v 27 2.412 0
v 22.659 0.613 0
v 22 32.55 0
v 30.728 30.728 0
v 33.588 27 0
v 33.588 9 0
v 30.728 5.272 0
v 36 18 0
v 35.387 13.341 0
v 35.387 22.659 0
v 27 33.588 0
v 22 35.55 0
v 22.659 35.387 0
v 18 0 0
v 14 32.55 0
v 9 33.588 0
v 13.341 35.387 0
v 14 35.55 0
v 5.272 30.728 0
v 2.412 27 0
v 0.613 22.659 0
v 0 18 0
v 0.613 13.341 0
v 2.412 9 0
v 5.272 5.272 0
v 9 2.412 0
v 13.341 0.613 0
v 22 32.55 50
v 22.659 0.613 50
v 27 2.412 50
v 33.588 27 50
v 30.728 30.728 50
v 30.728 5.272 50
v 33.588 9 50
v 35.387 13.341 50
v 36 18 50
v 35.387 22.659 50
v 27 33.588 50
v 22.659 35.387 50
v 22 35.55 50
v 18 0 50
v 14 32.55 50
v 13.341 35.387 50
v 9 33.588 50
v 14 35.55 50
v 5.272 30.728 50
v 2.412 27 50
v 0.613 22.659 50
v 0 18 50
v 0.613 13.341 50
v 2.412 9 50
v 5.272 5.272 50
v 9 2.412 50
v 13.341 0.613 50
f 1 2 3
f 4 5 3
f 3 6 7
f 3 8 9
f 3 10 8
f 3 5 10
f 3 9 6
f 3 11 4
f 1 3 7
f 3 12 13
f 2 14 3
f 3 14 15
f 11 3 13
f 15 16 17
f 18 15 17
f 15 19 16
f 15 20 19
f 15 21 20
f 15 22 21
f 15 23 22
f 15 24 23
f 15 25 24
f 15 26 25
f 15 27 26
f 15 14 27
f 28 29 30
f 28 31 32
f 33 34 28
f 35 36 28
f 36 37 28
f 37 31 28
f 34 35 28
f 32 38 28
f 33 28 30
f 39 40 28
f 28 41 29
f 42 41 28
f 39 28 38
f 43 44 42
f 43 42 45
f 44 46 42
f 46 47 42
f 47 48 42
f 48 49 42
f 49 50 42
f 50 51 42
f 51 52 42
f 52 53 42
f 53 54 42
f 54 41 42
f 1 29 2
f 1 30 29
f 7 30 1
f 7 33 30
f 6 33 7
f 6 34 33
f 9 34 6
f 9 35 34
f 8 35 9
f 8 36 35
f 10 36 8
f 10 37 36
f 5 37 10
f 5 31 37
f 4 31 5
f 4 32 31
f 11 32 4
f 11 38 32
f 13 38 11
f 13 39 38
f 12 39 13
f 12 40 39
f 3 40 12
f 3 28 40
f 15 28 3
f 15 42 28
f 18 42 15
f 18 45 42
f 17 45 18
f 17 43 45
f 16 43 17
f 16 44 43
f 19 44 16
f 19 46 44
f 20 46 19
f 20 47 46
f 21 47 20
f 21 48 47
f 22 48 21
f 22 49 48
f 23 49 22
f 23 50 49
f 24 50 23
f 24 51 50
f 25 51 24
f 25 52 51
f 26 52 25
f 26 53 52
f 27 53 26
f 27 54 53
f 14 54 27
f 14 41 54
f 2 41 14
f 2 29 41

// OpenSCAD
$fn = 32;

// ----------------------------------------------------------------------
// Keyway shaft: d36 shaft, key 8 x 3 mm
// ----------------------------------------------------------------------

// --- parameters (mm) ---
shaft_r = 18;             // shaft radius
key_w = 8;                // keyway width
key_d = 3;                // keyway depth below the surface line
plate_t = 50;             // shaft length, Z (extrusion height)

shaft_d = 2 * shaft_r;  // shaft diameter
circle_step = 15;  // polygon sampling step, degrees

profile = [[13.341, 35.387], [9, 33.588], [5.272, 30.728], [2.412, 27], [0.613, 22.659], [0, 18], [0.613, 13.341], [2.412, 9], [5.272, 5.272], [9, 2.412], [13.341, 0.613], [18, 0], [22.659, 0.613], [27, 2.412], [30.728, 5.272], [33.588, 9], [35.387, 13.341], [36, 18], [35.387, 22.659], [33.588, 27], [30.728, 30.728], [27, 33.588], [22.659, 35.387], [22, 35.55], [22, 32.55], [14, 32.55], [14, 35.55]];  // primary outline, 27 points, counter clockwise

// --- the one profile operation ---
linear_extrude(height = plate_t) polygon(points = profile);
